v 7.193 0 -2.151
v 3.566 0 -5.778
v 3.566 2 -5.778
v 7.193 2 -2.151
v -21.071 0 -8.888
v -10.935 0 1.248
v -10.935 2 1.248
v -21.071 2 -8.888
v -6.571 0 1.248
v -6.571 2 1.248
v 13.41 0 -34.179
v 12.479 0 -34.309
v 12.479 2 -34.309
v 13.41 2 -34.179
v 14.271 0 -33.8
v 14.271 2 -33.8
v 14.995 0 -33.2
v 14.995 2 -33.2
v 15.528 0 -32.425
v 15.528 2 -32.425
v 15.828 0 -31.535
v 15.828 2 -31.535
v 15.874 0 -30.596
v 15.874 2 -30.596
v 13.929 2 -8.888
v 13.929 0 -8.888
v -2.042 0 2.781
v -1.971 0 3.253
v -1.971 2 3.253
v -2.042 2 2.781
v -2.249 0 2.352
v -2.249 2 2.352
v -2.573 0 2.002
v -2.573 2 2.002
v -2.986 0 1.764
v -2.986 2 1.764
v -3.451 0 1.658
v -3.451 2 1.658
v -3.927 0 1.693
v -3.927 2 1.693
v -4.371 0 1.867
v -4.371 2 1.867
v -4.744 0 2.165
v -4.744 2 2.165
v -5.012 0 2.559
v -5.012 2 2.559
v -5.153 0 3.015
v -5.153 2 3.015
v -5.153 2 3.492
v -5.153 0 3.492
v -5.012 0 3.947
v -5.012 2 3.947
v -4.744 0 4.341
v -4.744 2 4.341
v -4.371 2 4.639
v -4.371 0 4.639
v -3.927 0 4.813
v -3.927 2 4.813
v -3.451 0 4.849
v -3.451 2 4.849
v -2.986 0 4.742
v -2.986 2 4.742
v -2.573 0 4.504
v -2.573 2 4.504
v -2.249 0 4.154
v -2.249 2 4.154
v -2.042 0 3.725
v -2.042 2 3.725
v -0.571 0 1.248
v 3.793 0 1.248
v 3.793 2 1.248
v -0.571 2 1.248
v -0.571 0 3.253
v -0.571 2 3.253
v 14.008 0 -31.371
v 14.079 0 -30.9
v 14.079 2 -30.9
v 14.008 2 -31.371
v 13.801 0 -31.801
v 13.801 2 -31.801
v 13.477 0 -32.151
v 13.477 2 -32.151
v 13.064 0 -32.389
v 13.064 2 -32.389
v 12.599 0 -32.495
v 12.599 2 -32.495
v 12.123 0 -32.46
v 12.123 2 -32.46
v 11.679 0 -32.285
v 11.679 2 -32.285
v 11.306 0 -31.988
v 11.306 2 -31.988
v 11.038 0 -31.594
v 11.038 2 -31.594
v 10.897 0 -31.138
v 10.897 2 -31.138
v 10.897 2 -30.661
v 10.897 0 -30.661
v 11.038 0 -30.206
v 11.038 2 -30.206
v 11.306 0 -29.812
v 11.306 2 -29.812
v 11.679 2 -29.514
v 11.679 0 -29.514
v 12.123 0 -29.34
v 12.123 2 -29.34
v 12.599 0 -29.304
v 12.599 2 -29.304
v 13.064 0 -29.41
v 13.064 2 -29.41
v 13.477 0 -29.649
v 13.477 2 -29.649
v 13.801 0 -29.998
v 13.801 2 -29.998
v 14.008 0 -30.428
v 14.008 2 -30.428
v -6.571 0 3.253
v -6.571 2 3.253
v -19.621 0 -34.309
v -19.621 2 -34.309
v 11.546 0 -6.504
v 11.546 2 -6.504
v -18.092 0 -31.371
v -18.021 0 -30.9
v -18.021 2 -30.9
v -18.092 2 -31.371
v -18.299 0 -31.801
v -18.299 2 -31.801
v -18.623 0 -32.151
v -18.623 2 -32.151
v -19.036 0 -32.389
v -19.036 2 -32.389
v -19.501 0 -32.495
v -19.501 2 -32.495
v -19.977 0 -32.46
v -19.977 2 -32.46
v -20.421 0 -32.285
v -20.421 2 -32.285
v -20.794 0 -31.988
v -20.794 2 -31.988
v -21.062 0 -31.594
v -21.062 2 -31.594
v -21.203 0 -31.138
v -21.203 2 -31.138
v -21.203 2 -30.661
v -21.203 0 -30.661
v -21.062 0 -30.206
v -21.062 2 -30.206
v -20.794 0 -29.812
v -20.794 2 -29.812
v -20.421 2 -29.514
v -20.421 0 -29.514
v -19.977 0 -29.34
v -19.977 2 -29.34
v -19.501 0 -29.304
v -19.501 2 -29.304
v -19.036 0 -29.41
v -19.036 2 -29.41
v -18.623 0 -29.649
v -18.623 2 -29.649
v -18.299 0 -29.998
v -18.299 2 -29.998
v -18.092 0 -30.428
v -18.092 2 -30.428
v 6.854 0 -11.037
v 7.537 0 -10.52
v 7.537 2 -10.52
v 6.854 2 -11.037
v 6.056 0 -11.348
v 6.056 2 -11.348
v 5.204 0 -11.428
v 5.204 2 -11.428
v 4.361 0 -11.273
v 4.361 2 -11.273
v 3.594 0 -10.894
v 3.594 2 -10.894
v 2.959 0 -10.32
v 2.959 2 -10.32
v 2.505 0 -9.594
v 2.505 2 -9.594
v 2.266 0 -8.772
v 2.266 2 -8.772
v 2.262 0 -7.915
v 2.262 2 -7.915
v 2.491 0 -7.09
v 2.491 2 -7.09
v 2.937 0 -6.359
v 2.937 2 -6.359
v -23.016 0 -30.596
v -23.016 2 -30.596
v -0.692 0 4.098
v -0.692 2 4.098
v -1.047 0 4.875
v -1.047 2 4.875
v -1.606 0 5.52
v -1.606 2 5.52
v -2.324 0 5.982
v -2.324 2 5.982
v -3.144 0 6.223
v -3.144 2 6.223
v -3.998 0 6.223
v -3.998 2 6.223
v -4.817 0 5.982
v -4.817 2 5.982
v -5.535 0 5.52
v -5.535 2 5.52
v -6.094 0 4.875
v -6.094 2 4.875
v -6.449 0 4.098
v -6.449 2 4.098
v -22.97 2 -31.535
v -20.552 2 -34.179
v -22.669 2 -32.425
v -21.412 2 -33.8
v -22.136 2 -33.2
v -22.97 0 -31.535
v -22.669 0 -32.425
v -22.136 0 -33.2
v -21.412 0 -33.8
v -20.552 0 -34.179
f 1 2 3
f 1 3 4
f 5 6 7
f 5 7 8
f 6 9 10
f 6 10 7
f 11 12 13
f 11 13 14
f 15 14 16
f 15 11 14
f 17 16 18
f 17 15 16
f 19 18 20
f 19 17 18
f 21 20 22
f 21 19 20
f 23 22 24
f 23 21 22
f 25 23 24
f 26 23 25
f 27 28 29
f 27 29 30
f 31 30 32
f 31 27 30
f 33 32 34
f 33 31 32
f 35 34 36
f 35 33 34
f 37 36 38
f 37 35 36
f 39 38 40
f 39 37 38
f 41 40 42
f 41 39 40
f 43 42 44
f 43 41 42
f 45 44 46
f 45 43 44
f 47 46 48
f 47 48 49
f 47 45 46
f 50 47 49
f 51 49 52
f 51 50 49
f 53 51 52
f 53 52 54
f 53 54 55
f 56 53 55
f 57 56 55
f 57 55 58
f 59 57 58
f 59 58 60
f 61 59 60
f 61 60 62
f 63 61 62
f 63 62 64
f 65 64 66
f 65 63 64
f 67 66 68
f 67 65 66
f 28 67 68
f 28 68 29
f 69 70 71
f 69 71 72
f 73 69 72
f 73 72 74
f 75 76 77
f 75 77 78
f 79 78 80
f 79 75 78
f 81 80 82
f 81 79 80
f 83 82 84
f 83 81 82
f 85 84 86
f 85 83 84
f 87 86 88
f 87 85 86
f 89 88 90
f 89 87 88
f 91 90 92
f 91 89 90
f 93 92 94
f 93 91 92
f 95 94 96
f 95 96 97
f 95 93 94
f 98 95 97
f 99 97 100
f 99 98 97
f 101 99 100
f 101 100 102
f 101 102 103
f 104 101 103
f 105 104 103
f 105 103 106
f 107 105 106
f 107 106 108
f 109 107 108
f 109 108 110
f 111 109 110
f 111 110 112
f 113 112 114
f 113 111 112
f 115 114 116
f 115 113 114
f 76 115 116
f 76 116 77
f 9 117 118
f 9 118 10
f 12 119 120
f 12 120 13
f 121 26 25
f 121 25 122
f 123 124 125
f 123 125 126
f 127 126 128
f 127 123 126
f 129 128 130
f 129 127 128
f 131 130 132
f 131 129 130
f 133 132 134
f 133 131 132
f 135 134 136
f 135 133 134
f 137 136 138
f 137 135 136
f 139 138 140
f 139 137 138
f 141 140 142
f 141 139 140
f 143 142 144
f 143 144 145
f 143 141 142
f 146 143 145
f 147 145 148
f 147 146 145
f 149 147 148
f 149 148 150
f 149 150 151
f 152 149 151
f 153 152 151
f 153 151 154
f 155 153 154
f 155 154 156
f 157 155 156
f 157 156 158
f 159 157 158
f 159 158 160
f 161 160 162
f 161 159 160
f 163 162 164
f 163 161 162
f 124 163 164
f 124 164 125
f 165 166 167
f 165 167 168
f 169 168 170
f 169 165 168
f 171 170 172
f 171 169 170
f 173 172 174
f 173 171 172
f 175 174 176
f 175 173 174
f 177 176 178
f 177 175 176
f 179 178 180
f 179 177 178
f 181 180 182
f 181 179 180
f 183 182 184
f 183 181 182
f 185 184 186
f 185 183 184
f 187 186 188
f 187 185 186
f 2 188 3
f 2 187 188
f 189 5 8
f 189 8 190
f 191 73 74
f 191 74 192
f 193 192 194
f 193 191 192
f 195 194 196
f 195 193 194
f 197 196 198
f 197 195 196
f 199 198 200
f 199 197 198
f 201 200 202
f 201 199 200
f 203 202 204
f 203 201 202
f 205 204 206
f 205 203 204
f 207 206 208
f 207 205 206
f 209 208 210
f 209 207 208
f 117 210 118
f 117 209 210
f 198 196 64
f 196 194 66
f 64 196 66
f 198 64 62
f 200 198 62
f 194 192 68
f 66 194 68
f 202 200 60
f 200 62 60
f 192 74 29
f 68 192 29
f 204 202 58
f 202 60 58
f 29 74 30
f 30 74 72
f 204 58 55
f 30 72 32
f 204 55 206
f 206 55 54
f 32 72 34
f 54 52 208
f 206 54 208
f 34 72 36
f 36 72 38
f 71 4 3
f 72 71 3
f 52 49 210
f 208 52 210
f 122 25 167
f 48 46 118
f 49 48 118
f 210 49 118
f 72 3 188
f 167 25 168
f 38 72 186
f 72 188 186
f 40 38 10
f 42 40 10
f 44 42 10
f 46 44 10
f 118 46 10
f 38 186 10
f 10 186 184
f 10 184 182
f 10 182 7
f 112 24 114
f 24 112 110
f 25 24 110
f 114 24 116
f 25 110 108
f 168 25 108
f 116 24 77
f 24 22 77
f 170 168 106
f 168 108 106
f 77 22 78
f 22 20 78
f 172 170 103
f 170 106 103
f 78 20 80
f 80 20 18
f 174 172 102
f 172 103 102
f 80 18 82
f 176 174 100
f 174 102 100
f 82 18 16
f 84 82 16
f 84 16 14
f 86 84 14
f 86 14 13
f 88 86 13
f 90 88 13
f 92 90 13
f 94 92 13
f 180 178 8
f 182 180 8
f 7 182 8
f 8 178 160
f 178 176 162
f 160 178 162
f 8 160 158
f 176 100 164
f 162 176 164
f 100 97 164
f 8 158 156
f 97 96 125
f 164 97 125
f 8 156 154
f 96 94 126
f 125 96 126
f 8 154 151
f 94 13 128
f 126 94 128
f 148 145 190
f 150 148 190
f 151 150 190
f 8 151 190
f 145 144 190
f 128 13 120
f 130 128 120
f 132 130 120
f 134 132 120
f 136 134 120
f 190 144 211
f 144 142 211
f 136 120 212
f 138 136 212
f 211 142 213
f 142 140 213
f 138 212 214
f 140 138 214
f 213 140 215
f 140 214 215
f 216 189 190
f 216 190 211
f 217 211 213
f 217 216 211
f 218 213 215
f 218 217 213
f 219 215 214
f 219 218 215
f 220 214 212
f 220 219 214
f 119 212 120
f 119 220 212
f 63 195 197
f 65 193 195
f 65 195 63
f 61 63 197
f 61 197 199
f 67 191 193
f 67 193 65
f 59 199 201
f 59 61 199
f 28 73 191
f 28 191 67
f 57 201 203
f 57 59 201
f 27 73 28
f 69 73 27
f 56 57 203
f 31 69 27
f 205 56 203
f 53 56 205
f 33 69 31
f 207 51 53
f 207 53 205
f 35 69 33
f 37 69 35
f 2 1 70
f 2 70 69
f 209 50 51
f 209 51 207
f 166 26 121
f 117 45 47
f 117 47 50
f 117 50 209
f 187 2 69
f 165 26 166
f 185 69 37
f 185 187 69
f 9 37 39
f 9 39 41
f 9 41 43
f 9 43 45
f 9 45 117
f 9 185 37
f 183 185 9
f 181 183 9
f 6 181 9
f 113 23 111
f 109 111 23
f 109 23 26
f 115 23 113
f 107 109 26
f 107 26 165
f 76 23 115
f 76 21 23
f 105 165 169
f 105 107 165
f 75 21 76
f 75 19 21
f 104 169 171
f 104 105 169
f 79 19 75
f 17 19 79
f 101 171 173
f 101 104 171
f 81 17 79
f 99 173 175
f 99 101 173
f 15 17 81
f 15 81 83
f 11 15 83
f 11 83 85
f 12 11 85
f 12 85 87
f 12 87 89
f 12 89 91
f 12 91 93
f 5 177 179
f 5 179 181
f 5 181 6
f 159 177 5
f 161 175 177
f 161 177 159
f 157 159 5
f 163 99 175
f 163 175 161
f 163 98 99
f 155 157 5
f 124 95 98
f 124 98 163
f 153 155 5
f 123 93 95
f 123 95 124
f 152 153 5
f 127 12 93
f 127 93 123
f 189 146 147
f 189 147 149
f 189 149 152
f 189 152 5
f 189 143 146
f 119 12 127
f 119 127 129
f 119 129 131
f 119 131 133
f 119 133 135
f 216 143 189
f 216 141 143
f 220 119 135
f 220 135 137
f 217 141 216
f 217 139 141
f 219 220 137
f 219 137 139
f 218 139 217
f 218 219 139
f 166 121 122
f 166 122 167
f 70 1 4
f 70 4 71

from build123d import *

# Parameters (mm, degrees)
SKETCH1_R           = 1.6
BOSS_EXTRUDE1_DEPTH = 2


with BuildPart() as part:
    # Sketch1 → Boss-Extrude1 (new body)
    with BuildSketch(Plane(origin=(0, 0, 0), x_dir=(1, 0, 0), z_dir=(0, 1, 0))):
        with BuildLine():
            ThreePointArc((7.536585866, 10.5201286), (2.958706846, 10.319962474), (3.565513998, 5.778065527))
            Line((3.565513998, 5.778065527), (7.192643667, 2.150935858))
            Line((7.192643667, 2.150935858), (3.793373086, -1.248334723))
            Line((3.793373086, -1.248334723), (-0.570702654, -1.248334723))
            Line((-0.570702654, -1.248334723), (-0.570702654, -3.253047476))
            ThreePointArc((-0.570702654, -3.253047476), (-3.570702654, -6.253047476), (-6.570702654, -3.253047476))
            Line((-6.570702654, -3.253047476), (-6.570702654, -1.248334723))
            Line((-6.570702654, -1.248334723), (-10.934778393, -1.248334723))
            Line((-10.934778393, -1.248334723), (-21.070702654, 8.887589537))
            Line((-21.070702654, 8.887589537), (-23.015874855, 30.595563989))
            ThreePointArc((-23.015874855, 30.595563989), (-22.136333563, 33.200086558), (-19.620702654, 34.308568326))
            Line((-19.620702654, 34.308568326), (12.479297346, 34.308568326))
            ThreePointArc((12.479297346, 34.308568326), (14.994928256, 33.200086558), (15.874469548, 30.595563989))
            Line((15.874469548, 30.595563989), (13.929297346, 8.887589537))
            Line((13.929297346, 8.887589537), (11.545749837, 6.504042028))
            Line((11.545749837, 6.504042028), (7.536585866, 10.5201286))
        make_face()
        with Locations((-19.620702654, 30.899792953)):
            Circle(SKETCH1_R, mode=Mode.SUBTRACT)
        with Locations((12.479297346, 30.899792953)):
            Circle(SKETCH1_R, mode=Mode.SUBTRACT)
        with Locations((-3.570702654, -3.253047476)):
            Circle(SKETCH1_R, mode=Mode.SUBTRACT)
    extrude(amount=BOSS_EXTRUDE1_DEPTH)


solid = part.part
